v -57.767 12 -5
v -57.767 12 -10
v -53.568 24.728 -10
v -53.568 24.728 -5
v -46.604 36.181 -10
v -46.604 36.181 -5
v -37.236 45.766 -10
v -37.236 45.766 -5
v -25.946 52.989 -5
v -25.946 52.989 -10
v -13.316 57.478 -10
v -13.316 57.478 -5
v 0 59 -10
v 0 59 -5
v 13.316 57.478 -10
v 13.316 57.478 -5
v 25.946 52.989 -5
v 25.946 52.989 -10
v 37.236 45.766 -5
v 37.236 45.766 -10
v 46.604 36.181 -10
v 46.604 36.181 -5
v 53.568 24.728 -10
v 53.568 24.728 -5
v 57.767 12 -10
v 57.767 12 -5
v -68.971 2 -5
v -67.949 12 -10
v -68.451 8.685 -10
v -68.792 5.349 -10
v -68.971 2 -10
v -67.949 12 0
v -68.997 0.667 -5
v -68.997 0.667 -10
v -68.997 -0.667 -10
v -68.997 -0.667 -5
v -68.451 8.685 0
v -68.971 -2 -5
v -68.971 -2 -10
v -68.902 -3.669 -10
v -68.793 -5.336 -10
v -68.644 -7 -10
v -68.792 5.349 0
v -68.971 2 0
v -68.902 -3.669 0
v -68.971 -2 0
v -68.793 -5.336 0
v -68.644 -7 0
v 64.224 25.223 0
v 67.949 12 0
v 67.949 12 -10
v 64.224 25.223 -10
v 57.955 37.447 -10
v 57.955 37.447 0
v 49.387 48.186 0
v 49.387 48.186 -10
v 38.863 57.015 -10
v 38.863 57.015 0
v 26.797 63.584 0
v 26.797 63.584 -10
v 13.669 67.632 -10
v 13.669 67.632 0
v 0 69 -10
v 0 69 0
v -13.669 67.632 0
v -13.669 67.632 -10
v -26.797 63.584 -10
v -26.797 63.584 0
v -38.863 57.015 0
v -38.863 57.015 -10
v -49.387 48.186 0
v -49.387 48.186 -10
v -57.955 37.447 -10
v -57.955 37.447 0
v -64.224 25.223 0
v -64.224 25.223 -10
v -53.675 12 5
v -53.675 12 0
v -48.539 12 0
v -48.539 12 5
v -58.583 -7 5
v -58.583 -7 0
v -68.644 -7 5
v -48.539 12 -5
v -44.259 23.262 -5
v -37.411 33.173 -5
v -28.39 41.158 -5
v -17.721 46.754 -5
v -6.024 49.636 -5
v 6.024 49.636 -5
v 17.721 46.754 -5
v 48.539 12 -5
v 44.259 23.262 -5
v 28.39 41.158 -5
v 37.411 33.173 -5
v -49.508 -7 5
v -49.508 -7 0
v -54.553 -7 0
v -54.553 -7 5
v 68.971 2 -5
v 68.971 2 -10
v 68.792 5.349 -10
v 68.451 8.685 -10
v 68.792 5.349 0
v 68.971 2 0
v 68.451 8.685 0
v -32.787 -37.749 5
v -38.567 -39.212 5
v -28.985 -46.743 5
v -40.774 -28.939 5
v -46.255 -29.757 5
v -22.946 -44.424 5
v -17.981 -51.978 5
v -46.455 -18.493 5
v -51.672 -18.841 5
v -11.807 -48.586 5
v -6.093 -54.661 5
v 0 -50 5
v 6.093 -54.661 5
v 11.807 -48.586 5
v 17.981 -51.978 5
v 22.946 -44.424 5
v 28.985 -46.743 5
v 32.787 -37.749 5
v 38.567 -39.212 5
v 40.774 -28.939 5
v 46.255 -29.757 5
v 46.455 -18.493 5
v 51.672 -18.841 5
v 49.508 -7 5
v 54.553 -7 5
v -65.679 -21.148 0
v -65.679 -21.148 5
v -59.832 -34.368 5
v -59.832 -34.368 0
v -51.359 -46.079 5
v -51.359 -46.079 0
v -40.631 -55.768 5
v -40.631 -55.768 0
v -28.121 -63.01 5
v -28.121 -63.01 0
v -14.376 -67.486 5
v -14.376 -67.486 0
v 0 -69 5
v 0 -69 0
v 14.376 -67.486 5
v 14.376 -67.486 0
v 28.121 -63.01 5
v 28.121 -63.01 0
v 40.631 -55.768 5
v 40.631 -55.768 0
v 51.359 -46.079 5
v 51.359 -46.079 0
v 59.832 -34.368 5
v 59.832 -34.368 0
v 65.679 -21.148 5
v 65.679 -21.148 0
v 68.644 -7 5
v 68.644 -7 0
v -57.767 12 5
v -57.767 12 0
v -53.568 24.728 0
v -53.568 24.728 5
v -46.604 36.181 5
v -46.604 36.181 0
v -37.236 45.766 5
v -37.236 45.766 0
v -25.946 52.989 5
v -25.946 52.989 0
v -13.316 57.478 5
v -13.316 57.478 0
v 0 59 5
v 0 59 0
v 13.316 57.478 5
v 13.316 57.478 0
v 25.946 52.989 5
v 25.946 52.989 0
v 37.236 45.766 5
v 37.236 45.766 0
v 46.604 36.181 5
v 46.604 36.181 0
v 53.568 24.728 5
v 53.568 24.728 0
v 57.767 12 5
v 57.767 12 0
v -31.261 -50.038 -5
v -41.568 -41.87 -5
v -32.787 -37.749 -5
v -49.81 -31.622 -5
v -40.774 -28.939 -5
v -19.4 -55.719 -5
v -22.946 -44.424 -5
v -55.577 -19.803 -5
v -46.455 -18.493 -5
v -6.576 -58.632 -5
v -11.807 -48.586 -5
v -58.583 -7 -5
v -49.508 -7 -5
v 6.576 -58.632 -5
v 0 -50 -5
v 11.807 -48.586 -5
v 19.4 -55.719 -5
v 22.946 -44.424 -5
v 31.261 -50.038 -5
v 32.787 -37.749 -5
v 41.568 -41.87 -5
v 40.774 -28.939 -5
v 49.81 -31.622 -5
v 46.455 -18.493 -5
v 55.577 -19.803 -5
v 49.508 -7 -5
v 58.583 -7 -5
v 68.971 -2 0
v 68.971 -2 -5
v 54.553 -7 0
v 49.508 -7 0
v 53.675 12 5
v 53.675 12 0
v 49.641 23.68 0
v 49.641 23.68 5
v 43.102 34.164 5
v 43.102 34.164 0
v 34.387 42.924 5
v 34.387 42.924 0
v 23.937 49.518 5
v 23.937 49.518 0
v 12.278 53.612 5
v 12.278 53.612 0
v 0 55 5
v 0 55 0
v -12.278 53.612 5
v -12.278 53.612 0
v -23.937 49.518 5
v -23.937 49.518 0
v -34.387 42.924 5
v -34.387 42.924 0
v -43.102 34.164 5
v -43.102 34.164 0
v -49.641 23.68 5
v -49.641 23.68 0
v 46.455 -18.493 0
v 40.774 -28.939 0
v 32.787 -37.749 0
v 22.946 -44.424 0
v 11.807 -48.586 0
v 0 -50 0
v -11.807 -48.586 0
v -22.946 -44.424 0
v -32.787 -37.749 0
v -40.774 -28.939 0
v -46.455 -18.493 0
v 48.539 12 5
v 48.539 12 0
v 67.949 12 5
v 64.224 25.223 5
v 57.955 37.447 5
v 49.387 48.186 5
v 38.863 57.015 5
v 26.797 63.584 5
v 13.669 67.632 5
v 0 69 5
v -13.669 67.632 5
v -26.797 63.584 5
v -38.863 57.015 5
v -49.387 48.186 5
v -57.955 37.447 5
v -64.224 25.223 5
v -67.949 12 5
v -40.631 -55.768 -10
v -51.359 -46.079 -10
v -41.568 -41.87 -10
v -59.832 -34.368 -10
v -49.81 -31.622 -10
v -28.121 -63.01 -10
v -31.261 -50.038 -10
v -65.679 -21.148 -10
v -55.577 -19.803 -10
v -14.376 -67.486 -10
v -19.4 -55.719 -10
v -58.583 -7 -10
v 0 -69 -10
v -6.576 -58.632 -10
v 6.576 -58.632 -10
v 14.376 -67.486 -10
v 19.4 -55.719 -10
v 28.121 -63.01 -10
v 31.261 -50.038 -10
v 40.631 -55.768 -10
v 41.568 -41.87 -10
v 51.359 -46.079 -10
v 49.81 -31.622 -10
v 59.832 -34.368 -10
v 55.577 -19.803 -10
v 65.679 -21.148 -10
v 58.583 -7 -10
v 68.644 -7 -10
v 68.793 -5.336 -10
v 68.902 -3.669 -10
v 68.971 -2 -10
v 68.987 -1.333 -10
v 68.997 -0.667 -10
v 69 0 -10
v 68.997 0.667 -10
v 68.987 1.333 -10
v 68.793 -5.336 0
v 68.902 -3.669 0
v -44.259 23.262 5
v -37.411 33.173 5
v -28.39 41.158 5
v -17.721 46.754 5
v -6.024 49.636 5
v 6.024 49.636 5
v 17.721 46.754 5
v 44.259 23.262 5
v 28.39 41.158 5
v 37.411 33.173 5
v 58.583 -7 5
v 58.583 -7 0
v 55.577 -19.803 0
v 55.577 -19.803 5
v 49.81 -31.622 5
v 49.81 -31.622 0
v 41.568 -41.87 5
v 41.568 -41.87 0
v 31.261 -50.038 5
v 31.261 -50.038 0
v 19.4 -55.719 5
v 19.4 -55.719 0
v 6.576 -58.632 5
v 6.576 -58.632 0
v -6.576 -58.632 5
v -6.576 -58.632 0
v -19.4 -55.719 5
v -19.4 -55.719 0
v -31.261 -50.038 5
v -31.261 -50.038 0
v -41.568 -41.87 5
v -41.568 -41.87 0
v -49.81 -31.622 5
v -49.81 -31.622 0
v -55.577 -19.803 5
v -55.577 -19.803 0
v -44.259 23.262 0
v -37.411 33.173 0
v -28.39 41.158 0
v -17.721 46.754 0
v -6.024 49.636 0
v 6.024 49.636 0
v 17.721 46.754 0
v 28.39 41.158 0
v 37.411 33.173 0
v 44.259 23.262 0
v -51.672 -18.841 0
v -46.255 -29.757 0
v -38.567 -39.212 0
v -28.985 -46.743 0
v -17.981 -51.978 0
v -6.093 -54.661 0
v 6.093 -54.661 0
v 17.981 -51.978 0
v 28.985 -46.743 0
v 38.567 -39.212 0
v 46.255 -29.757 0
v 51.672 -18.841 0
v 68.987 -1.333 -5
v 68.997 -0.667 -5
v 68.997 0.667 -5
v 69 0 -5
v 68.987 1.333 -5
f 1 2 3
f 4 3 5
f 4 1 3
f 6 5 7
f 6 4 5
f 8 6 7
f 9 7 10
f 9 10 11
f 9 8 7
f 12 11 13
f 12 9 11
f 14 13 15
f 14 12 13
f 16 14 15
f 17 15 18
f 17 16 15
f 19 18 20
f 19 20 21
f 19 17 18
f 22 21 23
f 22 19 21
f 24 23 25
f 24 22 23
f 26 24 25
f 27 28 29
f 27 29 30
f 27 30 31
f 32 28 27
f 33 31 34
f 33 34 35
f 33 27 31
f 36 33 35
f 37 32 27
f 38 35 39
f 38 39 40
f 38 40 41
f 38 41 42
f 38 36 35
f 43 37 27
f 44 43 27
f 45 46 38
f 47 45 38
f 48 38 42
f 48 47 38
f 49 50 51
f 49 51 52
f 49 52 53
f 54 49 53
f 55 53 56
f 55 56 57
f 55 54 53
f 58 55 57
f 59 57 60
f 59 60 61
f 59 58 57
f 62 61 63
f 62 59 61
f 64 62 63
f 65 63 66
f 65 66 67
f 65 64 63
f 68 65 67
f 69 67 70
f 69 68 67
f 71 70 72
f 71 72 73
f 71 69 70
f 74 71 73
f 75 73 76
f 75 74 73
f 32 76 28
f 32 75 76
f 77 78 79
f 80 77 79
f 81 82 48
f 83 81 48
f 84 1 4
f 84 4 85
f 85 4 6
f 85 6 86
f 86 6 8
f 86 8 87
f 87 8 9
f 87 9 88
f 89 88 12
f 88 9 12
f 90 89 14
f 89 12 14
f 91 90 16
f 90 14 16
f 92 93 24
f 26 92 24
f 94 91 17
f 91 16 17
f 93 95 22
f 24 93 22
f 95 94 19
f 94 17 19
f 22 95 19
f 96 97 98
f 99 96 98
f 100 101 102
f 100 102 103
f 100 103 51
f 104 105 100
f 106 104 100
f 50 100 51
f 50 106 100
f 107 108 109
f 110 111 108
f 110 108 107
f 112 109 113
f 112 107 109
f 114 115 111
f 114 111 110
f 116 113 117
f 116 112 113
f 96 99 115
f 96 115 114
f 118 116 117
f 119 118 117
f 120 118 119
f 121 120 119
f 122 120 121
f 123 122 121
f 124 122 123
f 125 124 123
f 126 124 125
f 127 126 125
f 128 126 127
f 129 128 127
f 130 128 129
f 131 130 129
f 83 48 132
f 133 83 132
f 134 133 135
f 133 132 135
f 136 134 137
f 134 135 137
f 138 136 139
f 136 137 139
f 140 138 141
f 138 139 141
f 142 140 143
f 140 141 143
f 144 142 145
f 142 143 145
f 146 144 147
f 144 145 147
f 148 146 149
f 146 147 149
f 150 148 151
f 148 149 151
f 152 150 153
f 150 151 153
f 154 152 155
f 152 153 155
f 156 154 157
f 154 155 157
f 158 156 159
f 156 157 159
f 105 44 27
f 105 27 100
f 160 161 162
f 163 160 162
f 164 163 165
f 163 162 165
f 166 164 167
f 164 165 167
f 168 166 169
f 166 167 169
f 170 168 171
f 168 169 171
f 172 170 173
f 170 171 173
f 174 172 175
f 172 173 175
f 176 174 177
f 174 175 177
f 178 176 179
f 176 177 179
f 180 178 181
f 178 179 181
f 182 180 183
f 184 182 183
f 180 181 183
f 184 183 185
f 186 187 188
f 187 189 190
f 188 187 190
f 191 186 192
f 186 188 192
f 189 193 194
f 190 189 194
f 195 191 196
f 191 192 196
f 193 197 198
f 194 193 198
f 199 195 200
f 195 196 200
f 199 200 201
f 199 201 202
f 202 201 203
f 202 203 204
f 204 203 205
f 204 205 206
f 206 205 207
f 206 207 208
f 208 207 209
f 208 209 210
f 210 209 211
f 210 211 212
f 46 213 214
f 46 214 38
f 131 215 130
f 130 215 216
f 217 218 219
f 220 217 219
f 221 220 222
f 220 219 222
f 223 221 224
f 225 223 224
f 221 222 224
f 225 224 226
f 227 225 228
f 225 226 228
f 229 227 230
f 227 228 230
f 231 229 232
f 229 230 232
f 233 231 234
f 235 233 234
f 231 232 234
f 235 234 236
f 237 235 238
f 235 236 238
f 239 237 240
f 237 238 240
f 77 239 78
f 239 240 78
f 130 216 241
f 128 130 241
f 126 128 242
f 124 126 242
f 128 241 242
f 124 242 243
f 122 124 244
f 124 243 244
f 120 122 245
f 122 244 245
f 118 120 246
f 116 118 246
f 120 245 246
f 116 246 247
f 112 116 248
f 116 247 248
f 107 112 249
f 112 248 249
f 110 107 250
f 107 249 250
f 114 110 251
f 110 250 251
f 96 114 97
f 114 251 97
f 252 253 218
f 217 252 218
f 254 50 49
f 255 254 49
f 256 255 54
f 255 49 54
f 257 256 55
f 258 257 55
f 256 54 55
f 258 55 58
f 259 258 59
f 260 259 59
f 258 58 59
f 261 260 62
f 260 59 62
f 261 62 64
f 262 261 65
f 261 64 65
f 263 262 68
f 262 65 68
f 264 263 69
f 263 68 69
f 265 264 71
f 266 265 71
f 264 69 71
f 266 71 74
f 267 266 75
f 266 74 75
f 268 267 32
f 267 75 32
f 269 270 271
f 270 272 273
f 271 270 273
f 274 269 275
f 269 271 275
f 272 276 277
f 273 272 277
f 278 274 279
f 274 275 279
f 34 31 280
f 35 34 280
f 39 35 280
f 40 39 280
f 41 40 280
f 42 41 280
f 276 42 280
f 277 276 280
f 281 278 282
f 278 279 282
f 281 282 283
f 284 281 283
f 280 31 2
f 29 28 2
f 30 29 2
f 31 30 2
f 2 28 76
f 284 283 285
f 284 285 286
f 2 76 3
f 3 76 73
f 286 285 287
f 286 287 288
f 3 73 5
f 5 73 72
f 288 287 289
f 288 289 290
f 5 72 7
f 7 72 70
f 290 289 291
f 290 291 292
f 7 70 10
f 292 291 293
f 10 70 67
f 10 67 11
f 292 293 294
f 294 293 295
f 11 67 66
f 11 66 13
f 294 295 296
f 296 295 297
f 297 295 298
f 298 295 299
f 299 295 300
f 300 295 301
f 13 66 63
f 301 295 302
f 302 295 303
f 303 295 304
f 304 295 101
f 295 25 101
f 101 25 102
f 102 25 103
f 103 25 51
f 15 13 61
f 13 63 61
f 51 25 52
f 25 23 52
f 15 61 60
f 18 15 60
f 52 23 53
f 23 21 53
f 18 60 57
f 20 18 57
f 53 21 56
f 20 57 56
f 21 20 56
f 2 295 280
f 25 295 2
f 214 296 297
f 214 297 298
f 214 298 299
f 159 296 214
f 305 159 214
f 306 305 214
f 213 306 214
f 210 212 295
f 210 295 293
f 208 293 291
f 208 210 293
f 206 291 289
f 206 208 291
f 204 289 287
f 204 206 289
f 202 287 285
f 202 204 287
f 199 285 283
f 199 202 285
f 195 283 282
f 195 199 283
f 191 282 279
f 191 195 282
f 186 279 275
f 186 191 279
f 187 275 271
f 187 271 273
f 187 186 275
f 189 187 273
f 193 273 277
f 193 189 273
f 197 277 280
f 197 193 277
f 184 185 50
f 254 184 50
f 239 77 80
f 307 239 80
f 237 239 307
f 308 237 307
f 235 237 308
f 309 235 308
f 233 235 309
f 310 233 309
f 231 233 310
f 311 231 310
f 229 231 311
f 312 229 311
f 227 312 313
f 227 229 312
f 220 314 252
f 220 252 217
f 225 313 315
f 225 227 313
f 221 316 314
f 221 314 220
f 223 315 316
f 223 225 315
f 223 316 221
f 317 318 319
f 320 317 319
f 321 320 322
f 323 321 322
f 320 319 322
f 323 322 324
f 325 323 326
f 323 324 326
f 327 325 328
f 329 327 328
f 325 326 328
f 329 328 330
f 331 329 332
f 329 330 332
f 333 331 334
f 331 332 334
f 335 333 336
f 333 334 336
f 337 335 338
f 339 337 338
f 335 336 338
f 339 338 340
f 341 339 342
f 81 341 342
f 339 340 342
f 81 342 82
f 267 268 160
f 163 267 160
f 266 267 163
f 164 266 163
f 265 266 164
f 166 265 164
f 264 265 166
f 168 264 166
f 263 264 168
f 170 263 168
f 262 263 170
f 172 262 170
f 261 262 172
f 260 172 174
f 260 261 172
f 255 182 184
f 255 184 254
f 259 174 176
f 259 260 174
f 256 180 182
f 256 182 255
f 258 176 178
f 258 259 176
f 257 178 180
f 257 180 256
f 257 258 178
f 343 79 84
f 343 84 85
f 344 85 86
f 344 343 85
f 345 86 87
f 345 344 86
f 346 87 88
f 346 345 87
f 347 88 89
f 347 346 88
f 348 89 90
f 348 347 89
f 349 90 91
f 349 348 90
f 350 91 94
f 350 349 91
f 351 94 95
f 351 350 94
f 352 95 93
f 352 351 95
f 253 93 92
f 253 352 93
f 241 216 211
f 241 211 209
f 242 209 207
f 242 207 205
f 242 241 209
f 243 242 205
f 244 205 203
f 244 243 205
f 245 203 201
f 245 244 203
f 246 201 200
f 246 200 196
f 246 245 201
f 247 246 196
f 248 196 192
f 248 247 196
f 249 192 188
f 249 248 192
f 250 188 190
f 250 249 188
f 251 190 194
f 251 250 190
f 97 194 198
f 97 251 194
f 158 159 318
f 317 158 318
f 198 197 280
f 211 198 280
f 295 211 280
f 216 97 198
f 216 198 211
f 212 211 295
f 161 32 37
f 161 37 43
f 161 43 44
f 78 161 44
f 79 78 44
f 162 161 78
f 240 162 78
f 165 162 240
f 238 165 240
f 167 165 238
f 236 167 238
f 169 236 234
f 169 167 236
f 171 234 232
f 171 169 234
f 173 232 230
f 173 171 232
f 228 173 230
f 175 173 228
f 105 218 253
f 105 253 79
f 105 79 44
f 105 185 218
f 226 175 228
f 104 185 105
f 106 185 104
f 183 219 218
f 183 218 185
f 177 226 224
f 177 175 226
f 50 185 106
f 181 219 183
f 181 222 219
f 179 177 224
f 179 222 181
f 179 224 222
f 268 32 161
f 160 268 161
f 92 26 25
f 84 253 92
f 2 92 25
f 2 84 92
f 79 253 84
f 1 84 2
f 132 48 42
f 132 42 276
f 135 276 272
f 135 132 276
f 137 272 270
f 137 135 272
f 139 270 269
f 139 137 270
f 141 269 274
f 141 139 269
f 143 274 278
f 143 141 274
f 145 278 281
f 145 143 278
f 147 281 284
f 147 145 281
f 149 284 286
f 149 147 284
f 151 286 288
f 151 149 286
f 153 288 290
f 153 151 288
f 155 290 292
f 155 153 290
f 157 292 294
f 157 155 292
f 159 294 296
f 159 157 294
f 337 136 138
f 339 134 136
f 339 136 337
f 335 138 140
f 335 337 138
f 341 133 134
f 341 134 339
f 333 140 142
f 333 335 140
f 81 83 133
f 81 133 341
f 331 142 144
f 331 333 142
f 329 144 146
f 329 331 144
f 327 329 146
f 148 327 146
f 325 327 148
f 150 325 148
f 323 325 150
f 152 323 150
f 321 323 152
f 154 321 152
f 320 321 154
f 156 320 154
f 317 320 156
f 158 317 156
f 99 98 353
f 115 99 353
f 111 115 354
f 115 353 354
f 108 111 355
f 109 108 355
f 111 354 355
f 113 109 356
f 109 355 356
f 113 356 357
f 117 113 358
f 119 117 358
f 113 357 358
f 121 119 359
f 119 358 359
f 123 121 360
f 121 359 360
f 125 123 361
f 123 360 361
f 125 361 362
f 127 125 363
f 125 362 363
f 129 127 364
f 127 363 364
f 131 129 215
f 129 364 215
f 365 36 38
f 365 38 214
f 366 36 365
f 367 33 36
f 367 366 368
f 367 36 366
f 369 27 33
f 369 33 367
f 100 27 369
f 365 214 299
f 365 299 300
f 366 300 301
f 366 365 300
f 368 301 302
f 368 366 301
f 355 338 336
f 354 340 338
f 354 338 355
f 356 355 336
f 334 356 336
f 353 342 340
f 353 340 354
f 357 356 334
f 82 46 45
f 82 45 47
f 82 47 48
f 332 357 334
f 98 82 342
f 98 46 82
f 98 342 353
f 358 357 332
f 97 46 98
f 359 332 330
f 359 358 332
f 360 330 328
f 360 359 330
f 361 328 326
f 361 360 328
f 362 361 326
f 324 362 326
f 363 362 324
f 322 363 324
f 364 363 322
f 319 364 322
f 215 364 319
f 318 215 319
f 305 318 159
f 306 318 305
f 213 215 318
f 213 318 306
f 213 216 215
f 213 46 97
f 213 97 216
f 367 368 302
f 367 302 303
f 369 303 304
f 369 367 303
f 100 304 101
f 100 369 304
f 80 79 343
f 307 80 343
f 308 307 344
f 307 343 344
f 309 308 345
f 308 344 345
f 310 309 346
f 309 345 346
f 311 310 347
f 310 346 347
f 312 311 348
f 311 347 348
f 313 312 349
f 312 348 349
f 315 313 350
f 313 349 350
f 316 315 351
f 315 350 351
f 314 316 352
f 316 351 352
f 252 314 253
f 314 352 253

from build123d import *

# Parameters (mm, degrees)
F1_START = -5
F1_DEPTH = 5
F2_DEPTH = 5
F3_DEPTH = 10
F4_DEPTH = 5
F5_DEPTH = 5


# Not quite as in the source:
# - after a boolean that leaves OpenCascade's solid faulty, fix() repairs it
# - a feature names something its author has since deleted; it is built from what else it names


with BuildPart() as f1:
    # F0 (on Top) → F1 (new body)
    with BuildSketch(Plane.XY.offset(F1_START)):
        with BuildLine():
            Line((0, 12), (-48.538644398, 12))
            Line((-48.538644398, 12), (-53.6749476013, 12))
            Line((-53.6749476013, 12), (-57.7667724561, 12))
            Line((-57.7667724561, 12), (-67.9485099174, 12))
            ThreePointArc((-67.9485099174, 12), (-68.6421053306, 7.0186448683), (-68.9710084021, 2))
            Line((-68.9710084021, 2), (0, 2))
            Line((0, 2), (0, 12))
        make_face()
        with BuildLine():
            Line((0, -7), (0, -2))
            Line((0, -2), (-68.9710084021, -2))
            ThreePointArc((-68.9710084021, -2), (-68.8529103806, -4.5029692558), (-68.6440092069, -7))
            Line((-68.6440092069, -7), (-58.5832740635, -7))
            Line((-58.5832740635, -7), (-54.5527267879, -7))
            Line((-54.5527267879, -7), (-49.5075751779, -7))
            Line((-49.5075751779, -7), (0, -7))
        make_face()
        with BuildLine():
            Line((68.9710084021, -2), (0, -2))
            Line((0, -2), (0, -7))
            Line((0, -7), (49.5075751779, -7))
            Line((49.5075751779, -7), (54.5527267879, -7))
            Line((54.5527267879, -7), (58.5832740635, -7))
            Line((58.5832740635, -7), (68.6440092069, -7))
            ThreePointArc((68.6440092069, -7), (68.8529103806, -4.5029692558), (68.9710084021, -2))
        make_face()
        with BuildLine():
            Line((68.9710084021, 2), (0, 2))
            Line((0, 2), (0, 0))
            Line((0, 0), (0, -2))
            Line((0, -2), (68.9710084021, -2))
            ThreePointArc((68.9710084021, -2), (68.9927517198, -1.0001050586), (69, 0))
            ThreePointArc((69, 0), (68.9927517198, 1.0001050586), (68.9710084021, 2))
        make_face()
        with BuildLine():
            Line((53.6749476013, 12), (48.538644398, 12))
            Line((48.538644398, 12), (0, 12))
            Line((0, 12), (0, 2))
            Line((0, 2), (68.9710084021, 2))
            ThreePointArc((68.9710084021, 2), (68.6421053306, 7.0186448683), (67.9485099174, 12))
            Line((67.9485099174, 12), (57.7667724561, 12))
            Line((57.7667724561, 12), (53.6749476013, 12))
        make_face()
        with BuildLine():
            Line((0, 0), (0, 2))
            Line((0, 2), (-68.9710084021, 2))
            ThreePointArc((-68.9710084021, 2), (-69, 0), (-68.9710084021, -2))
            Line((-68.9710084021, -2), (0, -2))
            Line((0, -2), (0, 0))
        make_face()
    extrude(amount=-F1_DEPTH)

    # F0 (on Top) → F2 (join)
    with BuildSketch(Plane.XY):
        with BuildLine():
            Line((0, -7), (0, -2))
            Line((0, -2), (-68.9710084021, -2))
            ThreePointArc((-68.9710084021, -2), (-68.8529103806, -4.5029692558), (-68.6440092069, -7))
            Line((-68.6440092069, -7), (-58.5832740635, -7))
            Line((-58.5832740635, -7), (-54.5527267879, -7))
            Line((-54.5527267879, -7), (-49.5075751779, -7))
            Line((-49.5075751779, -7), (0, -7))
        make_face()
        with BuildLine():
            Line((0, 12), (-48.538644398, 12))
            Line((-48.538644398, 12), (-53.6749476013, 12))
            Line((-53.6749476013, 12), (-57.7667724561, 12))
            Line((-57.7667724561, 12), (-67.9485099174, 12))
            ThreePointArc((-67.9485099174, 12), (-68.6421053306, 7.0186448683), (-68.9710084021, 2))
            Line((-68.9710084021, 2), (0, 2))
            Line((0, 2), (0, 12))
        make_face()
        with BuildLine():
            Line((53.6749476013, 12), (48.538644398, 12))
            Line((48.538644398, 12), (0, 12))
            Line((0, 12), (0, 2))
            Line((0, 2), (68.9710084021, 2))
            ThreePointArc((68.9710084021, 2), (68.6421053306, 7.0186448683), (67.9485099174, 12))
            Line((67.9485099174, 12), (57.7667724561, 12))
            Line((57.7667724561, 12), (53.6749476013, 12))
        make_face()
        with BuildLine():
            Line((68.9710084021, -2), (0, -2))
            Line((0, -2), (0, -7))
            Line((0, -7), (49.5075751779, -7))
            Line((49.5075751779, -7), (54.5527267879, -7))
            Line((54.5527267879, -7), (58.5832740635, -7))
            Line((58.5832740635, -7), (68.6440092069, -7))
            ThreePointArc((68.6440092069, -7), (68.8529103806, -4.5029692558), (68.9710084021, -2))
        make_face()
    extrude(amount=-F2_DEPTH)

    # F0 (on Top) → F3 (join)
    with BuildSketch(Plane.XY):
        with BuildLine():
            ThreePointArc((-57.7667724561, 12), (0, 59), (57.7667724561, 12))
            Line((57.7667724561, 12), (67.9485099174, 12))
            ThreePointArc((67.9485099174, 12), (0, 69), (-67.9485099174, 12))
            Line((-67.9485099174, 12), (-57.7667724561, 12))
        make_face()
        with BuildLine():
            Line((-58.5832740635, -7), (-68.6440092069, -7))
            ThreePointArc((-68.6440092069, -7), (0, -69), (68.6440092069, -7))
            Line((68.6440092069, -7), (58.5832740635, -7))
            ThreePointArc((58.5832740635, -7), (0, -59), (-58.5832740635, -7))
        make_face()
    extrude(amount=-F3_DEPTH)

    # F0 (on Top) → F4 (join)
    with BuildSketch(Plane.XY):
        with BuildLine():
            Line((54.5527267879, -7), (49.5075751779, -7))
            ThreePointArc((49.5075751779, -7), (0, -50), (-49.5075751779, -7))
            Line((-49.5075751779, -7), (-54.5527267879, -7))
            ThreePointArc((-54.5527267879, -7), (0, -55), (54.5527267879, -7))
        make_face()
        with BuildLine():
            ThreePointArc((-48.538644398, 12), (0, 50), (48.538644398, 12))
            Line((48.538644398, 12), (53.6749476013, 12))
            ThreePointArc((53.6749476013, 12), (0, 55), (-53.6749476013, 12))
            Line((-53.6749476013, 12), (-48.538644398, 12))
        make_face()
        with BuildLine():
            ThreePointArc((-53.6749476013, 12), (0, 55), (53.6749476013, 12))
            Line((53.6749476013, 12), (57.7667724561, 12))
            ThreePointArc((57.7667724561, 12), (0, 59), (-57.7667724561, 12))
            Line((-57.7667724561, 12), (-53.6749476013, 12))
        make_face()
        with BuildLine():
            Line((-54.5527267879, -7), (-58.5832740635, -7))
            ThreePointArc((-58.5832740635, -7), (0, -59), (58.5832740635, -7))
            Line((58.5832740635, -7), (54.5527267879, -7))
            ThreePointArc((54.5527267879, -7), (0, -55), (-54.5527267879, -7))
        make_face()
    extrude(amount=-F4_DEPTH)

    # F0 (on Top) → F5 (join)
    with BuildSketch(Plane.XY):
        with BuildLine():
            ThreePointArc((-57.7667724561, 12), (0, 59), (57.7667724561, 12))
            Line((57.7667724561, 12), (67.9485099174, 12))
            ThreePointArc((67.9485099174, 12), (0, 69), (-67.9485099174, 12))
            Line((-67.9485099174, 12), (-57.7667724561, 12))
        make_face()
        with BuildLine():
            ThreePointArc((-48.538644398, 12), (0, 50), (48.538644398, 12))
            Line((48.538644398, 12), (53.6749476013, 12))
            ThreePointArc((53.6749476013, 12), (0, 55), (-53.6749476013, 12))
            Line((-53.6749476013, 12), (-48.538644398, 12))
        make_face()
        with BuildLine():
            Line((-58.5832740635, -7), (-68.6440092069, -7))
            ThreePointArc((-68.6440092069, -7), (0, -69), (68.6440092069, -7))
            Line((68.6440092069, -7), (58.5832740635, -7))
            ThreePointArc((58.5832740635, -7), (0, -59), (-58.5832740635, -7))
        make_face()
        with BuildLine():
            Line((54.5527267879, -7), (49.5075751779, -7))
            ThreePointArc((49.5075751779, -7), (0, -50), (-49.5075751779, -7))
            Line((-49.5075751779, -7), (-54.5527267879, -7))
            ThreePointArc((-54.5527267879, -7), (0, -55), (54.5527267879, -7))
        make_face()
    extrude(amount=F5_DEPTH)

    add(f1.part.fix(), mode=Mode.REPLACE)


solid = f1.part
